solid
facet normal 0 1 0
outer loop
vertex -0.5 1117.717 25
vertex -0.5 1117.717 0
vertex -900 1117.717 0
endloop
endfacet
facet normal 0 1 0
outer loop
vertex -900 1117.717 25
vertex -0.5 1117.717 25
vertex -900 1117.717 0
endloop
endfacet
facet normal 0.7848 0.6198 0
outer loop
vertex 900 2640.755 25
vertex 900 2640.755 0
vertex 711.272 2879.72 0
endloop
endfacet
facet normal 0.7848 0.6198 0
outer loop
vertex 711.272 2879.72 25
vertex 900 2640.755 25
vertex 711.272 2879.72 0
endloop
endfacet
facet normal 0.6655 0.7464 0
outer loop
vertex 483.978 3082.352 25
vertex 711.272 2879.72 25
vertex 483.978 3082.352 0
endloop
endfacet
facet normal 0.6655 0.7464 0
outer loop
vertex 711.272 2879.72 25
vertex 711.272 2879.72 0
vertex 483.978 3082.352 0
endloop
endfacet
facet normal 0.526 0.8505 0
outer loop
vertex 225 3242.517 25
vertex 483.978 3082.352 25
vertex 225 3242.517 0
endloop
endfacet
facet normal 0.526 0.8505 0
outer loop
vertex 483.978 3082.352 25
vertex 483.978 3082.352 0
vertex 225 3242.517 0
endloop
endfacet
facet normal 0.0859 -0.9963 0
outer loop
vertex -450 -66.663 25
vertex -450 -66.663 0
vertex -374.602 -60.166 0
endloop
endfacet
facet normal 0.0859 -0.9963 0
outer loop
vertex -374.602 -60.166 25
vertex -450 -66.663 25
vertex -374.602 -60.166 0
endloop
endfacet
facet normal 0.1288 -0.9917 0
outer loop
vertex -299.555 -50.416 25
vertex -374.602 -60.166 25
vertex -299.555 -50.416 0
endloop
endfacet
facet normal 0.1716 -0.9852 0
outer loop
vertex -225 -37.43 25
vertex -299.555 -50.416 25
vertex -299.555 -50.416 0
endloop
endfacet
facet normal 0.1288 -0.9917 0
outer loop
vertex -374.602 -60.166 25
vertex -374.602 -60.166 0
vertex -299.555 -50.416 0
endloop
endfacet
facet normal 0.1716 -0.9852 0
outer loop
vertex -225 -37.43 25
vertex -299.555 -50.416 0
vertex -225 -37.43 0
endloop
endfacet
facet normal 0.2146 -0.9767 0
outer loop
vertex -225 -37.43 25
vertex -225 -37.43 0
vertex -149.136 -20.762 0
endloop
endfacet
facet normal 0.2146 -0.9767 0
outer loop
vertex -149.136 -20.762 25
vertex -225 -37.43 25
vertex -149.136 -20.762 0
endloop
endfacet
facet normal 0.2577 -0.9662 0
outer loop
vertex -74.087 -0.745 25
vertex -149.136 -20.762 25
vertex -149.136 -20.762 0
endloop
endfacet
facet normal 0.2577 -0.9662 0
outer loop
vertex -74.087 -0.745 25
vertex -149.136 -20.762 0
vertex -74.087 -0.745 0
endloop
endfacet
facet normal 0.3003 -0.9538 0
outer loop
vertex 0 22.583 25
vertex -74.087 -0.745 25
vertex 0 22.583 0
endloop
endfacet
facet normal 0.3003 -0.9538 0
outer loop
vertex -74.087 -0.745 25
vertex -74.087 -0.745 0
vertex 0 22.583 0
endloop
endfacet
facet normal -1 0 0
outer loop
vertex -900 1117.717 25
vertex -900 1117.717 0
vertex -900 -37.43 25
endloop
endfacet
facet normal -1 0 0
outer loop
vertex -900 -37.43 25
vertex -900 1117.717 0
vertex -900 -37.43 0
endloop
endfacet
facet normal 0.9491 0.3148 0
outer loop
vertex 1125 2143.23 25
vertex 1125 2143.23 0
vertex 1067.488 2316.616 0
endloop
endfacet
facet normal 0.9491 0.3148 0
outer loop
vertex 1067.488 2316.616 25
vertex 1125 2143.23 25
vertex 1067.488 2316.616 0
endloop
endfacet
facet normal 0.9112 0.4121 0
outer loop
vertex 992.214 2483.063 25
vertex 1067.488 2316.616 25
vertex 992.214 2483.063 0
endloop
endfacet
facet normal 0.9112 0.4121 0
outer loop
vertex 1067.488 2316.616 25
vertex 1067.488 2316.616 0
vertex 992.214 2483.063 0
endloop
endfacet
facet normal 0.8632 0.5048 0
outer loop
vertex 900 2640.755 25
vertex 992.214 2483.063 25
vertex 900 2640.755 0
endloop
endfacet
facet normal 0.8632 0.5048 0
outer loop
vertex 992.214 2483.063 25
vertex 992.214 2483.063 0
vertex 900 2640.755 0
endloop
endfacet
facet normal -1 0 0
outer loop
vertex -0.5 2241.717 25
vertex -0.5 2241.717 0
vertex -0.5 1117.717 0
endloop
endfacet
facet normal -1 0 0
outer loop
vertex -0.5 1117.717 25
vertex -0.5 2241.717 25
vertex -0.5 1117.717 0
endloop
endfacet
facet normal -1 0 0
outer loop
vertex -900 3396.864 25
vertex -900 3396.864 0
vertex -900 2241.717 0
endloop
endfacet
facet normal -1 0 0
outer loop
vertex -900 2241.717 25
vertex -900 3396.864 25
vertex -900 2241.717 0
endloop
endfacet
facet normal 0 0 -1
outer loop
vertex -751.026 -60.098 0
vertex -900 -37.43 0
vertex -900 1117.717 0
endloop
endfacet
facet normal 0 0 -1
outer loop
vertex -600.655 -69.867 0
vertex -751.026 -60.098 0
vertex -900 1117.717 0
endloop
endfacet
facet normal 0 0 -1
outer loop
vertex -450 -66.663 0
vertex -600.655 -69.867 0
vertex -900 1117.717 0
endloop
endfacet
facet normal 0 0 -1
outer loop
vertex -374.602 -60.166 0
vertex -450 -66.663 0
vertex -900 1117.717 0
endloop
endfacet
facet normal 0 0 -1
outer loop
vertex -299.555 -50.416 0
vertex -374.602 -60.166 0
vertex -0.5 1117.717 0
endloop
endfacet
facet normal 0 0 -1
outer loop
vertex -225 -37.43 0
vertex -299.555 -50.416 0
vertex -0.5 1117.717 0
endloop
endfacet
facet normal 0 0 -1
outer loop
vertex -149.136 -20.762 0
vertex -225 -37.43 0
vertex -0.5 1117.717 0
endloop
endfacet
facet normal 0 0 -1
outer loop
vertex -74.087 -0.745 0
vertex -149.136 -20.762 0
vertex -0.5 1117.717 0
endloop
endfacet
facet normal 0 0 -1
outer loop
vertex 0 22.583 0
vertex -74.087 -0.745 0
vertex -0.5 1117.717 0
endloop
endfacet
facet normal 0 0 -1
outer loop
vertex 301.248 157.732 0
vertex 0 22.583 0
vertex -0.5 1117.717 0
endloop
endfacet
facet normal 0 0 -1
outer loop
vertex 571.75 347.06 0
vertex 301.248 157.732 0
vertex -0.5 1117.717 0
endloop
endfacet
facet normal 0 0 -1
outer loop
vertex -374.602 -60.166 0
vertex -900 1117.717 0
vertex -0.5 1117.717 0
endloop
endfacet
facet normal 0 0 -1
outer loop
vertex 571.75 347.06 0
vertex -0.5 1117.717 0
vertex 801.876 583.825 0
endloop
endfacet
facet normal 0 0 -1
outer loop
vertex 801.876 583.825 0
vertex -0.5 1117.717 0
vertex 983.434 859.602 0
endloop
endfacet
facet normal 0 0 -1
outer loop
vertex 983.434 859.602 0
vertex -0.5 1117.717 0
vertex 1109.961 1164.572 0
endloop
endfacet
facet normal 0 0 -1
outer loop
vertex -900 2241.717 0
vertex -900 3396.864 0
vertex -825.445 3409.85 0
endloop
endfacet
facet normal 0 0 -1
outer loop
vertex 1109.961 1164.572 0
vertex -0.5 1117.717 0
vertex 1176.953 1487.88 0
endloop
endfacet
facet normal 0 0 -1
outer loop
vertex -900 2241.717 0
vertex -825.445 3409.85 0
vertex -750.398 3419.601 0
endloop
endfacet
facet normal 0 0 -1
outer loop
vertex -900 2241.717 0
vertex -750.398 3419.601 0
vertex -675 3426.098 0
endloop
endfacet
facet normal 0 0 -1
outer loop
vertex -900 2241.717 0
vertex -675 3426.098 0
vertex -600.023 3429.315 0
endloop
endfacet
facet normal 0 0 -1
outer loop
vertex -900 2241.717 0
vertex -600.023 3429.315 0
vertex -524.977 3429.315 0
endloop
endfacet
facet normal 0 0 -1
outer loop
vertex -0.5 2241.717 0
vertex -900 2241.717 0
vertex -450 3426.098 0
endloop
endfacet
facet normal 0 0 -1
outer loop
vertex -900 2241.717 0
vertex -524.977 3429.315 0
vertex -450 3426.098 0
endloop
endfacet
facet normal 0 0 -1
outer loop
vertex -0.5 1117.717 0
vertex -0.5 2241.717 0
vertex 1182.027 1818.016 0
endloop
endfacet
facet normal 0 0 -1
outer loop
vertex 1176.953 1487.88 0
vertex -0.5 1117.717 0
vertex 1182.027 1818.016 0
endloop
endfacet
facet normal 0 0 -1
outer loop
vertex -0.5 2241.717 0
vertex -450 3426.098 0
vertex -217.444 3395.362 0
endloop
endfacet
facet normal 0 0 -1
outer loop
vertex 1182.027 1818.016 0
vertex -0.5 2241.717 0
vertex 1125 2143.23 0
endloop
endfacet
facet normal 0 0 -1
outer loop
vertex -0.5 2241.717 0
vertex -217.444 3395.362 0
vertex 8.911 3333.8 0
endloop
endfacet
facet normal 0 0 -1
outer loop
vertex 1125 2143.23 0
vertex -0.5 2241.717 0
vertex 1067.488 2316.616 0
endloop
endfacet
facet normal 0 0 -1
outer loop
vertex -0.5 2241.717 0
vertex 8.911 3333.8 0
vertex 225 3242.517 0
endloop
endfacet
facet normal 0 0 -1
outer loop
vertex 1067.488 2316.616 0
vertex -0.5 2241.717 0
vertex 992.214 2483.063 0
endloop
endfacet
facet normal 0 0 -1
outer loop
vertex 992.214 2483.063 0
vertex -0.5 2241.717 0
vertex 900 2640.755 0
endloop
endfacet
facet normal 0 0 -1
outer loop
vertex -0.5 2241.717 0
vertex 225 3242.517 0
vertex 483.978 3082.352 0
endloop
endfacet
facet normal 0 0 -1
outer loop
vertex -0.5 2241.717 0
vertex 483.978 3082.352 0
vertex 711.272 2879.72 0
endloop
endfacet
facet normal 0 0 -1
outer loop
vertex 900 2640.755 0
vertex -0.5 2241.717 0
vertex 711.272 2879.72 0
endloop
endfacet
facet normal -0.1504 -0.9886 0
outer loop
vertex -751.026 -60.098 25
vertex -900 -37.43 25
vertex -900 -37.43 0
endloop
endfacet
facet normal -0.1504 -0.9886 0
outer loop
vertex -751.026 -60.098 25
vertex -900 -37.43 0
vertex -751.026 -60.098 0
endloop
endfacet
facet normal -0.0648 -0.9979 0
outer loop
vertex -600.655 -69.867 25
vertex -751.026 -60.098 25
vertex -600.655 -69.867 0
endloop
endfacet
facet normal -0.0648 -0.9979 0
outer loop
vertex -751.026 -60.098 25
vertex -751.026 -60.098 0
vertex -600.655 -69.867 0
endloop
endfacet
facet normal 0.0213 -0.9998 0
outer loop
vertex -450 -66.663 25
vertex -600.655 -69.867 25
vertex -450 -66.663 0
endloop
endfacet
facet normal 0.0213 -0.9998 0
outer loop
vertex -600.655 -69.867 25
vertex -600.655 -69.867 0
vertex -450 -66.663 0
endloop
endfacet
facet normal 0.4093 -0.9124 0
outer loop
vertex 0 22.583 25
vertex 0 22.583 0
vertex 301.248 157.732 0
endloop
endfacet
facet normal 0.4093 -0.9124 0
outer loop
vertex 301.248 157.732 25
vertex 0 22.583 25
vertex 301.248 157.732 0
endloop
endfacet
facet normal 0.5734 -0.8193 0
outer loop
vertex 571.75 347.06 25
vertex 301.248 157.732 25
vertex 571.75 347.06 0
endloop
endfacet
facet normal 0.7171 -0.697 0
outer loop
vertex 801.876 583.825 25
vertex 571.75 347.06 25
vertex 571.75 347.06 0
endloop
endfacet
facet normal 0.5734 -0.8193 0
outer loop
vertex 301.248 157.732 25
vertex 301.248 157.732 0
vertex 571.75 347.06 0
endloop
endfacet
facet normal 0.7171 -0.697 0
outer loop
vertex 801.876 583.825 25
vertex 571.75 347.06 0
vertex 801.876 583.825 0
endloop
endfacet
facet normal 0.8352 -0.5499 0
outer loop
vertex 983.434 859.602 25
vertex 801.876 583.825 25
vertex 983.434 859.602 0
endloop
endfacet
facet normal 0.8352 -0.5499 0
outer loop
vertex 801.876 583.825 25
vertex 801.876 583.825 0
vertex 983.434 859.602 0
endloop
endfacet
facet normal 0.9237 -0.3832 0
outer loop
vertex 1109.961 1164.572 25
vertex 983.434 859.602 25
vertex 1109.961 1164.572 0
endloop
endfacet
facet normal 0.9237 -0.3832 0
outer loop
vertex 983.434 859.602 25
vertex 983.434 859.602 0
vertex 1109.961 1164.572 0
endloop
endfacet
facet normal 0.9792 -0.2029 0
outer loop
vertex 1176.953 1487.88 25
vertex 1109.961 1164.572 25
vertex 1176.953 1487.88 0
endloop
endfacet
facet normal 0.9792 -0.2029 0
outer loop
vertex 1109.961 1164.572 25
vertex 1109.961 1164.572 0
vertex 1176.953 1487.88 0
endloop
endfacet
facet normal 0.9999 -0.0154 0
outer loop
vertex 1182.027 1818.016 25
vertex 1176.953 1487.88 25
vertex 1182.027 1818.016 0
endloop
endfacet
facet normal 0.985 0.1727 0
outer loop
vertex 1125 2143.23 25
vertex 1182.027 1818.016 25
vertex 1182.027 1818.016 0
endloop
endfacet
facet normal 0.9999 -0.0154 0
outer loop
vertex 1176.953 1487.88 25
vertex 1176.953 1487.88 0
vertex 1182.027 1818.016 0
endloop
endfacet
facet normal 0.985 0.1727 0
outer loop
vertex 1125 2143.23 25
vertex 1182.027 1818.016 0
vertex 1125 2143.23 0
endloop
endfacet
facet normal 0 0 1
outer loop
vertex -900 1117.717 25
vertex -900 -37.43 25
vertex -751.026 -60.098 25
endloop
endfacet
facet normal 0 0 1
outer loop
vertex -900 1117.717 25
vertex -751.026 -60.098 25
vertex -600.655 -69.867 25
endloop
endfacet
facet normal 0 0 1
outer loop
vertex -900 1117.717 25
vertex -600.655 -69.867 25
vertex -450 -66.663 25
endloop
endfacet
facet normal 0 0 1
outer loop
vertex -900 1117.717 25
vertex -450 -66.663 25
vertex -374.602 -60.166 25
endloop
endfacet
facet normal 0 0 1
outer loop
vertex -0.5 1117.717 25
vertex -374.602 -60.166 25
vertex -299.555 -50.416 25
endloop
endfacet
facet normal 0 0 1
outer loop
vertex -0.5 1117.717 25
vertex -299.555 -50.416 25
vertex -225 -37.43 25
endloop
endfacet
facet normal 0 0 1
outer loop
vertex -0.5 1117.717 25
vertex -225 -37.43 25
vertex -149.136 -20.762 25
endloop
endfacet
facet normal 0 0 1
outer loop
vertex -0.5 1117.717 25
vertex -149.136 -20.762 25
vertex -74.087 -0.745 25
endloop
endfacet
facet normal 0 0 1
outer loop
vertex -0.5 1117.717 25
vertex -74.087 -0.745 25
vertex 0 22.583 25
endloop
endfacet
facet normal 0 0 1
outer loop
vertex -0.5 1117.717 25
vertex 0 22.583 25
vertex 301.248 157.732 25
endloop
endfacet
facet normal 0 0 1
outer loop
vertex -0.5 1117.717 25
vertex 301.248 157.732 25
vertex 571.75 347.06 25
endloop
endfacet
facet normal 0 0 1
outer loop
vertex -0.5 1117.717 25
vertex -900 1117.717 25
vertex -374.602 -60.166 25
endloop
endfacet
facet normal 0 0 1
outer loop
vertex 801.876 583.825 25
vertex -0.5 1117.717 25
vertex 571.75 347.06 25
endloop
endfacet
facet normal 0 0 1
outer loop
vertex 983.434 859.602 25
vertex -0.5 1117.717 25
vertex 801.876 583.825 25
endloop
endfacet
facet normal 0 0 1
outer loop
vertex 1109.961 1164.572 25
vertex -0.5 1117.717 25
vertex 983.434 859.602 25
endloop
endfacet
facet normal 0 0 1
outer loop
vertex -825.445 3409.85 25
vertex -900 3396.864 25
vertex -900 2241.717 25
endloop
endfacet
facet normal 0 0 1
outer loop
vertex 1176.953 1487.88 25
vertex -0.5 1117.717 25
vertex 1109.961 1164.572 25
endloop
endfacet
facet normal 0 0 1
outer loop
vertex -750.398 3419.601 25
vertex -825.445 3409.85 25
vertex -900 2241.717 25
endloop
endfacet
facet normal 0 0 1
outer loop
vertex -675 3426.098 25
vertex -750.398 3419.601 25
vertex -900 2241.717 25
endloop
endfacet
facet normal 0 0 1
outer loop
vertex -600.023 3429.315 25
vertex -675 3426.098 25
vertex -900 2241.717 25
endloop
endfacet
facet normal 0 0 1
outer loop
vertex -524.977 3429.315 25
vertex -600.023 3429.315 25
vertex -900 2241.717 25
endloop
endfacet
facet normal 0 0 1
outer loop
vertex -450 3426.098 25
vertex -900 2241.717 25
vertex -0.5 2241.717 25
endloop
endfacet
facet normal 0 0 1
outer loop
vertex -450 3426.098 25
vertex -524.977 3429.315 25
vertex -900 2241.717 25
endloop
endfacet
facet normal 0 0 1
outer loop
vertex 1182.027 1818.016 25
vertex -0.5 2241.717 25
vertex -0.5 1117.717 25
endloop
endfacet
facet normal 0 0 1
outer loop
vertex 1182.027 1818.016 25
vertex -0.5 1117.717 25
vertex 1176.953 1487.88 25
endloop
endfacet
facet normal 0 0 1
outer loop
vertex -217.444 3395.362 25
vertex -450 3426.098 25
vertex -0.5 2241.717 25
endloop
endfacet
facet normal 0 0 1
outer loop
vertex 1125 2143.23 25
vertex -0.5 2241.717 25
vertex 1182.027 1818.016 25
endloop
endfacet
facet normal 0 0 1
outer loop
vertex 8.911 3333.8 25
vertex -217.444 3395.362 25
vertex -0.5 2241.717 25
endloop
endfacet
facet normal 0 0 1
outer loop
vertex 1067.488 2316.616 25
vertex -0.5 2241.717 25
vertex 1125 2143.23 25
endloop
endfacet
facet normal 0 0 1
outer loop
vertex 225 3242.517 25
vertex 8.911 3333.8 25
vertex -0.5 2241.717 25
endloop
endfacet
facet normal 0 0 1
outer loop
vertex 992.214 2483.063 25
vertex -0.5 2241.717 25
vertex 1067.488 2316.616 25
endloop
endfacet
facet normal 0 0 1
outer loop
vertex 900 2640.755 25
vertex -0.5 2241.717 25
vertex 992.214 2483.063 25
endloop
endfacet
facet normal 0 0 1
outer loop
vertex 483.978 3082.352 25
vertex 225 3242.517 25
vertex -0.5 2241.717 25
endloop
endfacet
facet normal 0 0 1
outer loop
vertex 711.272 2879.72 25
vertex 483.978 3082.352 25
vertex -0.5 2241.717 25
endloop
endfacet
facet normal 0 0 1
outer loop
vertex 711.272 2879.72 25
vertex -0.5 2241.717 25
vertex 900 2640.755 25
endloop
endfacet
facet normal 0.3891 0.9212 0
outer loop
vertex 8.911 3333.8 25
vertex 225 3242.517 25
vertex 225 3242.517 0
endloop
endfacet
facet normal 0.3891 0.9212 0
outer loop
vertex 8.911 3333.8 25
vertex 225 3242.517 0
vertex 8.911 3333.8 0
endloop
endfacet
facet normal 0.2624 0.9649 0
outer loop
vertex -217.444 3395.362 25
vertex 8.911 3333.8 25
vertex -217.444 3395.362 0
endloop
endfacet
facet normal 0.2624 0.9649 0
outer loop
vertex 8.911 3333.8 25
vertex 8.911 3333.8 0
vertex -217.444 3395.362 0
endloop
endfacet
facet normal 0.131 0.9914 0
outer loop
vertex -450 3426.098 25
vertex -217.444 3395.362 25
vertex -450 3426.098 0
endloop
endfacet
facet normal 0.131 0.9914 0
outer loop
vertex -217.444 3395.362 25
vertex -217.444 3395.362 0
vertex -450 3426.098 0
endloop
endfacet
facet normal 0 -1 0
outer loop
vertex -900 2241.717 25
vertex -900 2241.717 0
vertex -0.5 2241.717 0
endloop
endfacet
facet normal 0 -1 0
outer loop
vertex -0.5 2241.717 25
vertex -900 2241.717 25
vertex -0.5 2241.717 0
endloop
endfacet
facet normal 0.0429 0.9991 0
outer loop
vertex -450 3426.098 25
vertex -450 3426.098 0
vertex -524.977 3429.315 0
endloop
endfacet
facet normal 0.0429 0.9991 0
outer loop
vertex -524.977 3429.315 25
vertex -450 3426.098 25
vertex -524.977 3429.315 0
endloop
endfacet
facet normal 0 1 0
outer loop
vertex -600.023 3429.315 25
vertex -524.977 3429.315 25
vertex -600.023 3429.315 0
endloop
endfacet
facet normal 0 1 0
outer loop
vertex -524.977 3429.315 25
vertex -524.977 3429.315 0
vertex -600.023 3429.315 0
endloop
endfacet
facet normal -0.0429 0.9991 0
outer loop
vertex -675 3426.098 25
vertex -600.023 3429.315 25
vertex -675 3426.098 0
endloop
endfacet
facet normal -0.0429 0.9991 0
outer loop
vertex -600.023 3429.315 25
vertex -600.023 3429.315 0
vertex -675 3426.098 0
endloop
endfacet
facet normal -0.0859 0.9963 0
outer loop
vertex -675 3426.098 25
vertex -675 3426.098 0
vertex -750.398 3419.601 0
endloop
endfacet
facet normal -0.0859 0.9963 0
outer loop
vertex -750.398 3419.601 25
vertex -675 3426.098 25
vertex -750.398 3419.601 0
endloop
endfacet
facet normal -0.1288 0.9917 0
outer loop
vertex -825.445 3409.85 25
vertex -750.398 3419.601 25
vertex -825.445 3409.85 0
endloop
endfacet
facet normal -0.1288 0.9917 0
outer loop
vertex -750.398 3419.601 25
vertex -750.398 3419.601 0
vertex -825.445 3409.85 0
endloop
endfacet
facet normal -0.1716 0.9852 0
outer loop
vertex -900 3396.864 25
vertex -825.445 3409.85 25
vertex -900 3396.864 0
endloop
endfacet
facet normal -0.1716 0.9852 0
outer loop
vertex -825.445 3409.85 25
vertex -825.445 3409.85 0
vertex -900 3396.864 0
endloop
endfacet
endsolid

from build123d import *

# Parameters (mm, degrees)
F1_DEPTH = 25


with BuildPart() as f1:
    # F0 (on Top) → F1 (new body)
    with BuildSketch(Plane.XY):
        with BuildLine():
            Line((-675, 2241.7173917294), (-675, 3426.0975765688))
            ThreePointArc((-675, 3426.0975765688), (-787.9742669801, 3415.1312775012), (-900, 3396.8643714606))
            Line((-900, 3396.8643714606), (-900, 2241.7173917294))
            Line((-900, 2241.7173917294), (-675, 2241.7173917294))
        make_face()
        with BuildLine():
            Line((-450, 2241.7173917294), (-450, 3426.0975765688))
            ThreePointArc((-450, 3426.0975765688), (-562.5, 3429.7173917294), (-675, 3426.0975765688))
            Line((-675, 3426.0975765688), (-675, 2241.7173917294))
            Line((-675, 2241.7173917294), (-450, 2241.7173917294))
        make_face()
        with BuildLine():
            Line((-675, -66.6627931101), (-675, 1117.7173917294))
            Line((-675, 1117.7173917294), (-900, 1117.7173917294))
            Line((-900, 1117.7173917294), (-900, -37.4295880018))
            ThreePointArc((-900, -37.4295880018), (-787.9742669801, -55.6964940425), (-675, -66.6627931101))
        make_face()
        with BuildLine():
            Line((-450, -66.6627931101), (-450, 1117.7173917294))
            Line((-450, 1117.7173917294), (-675, 1117.7173917294))
            Line((-675, 1117.7173917294), (-675, -66.6627931101))
            ThreePointArc((-675, -66.6627931101), (-562.5, -70.2826082706), (-450, -66.6627931101))
        make_face()
        with BuildLine():
            Line((-225, 1117.7173917294), (-450, 1117.7173917294))
            Line((-450, 1117.7173917294), (-450, -66.6627931101))
            ThreePointArc((-450, -66.6627931101), (-337.0257330199, -55.6964940425), (-225, -37.4295880018))
            Line((-225, -37.4295880018), (-225, 1117.7173917294))
        make_face()
        with BuildLine():
            ThreePointArc((0, 3336.8515896747), (-111.5006834878, 3370.6046193426), (-225, 3396.8643714606))
            Line((-225, 3396.8643714606), (-225, 2241.7173917294))
            Line((-225, 2241.7173917294), (-0.5, 2241.7173917294))
            Line((-0.5, 2241.7173917294), (-0.5, 1117.7173917294))
            Line((-0.5, 1117.7173917294), (-225, 1117.7173917294))
            Line((-225, 1117.7173917294), (-225, -37.4295880018))
            ThreePointArc((-225, -37.4295880018), (-111.5006834878, -11.1698358839), (0, 22.583193784))
            Line((0, 22.583193784), (0, 3336.8515896747))
        make_face()
        with BuildLine():
            ThreePointArc((450, 3107.0729010542), (340.044348253, 3179.0217969241), (225, 3242.5173629349))
            Line((225, 3242.5173629349), (225, 116.9174205238))
            ThreePointArc((225, 116.9174205238), (340.044348253, 180.4129865346), (450, 252.3618824045))
            Line((450, 252.3618824045), (450, 3107.0729010542))
        make_face()
        with BuildLine():
            ThreePointArc((900, 2640.7552421807), (794.5520917452, 2784.6651824823), (674.9999999999, 2917.0911226612))
            Line((675, 2917.0911226612), (675, 442.3436607977))
            ThreePointArc((675.0000000001, 442.3436607977), (794.5520917453, 574.7696009764), (900, 718.679541278))
            Line((900, 718.679541278), (900, 2640.7552421807))
        make_face()
        with BuildLine():
            ThreePointArc((1125, 2143.2297971729), (1032.024346665, 2400.8221746094), (900, 2640.7552421807))
            Line((900, 2640.7552421807), (900, 718.679541278))
            ThreePointArc((900, 718.679541278), (1032.024346665, 958.6126088493), (1125, 1216.2049862858))
            Line((1125, 1216.2049862858), (1125, 2143.2297971729))
        make_face()
        with BuildLine():
            ThreePointArc((1187.5, 1679.7173917294), (1171.8046156889, 1913.5709784027), (1125, 2143.2297971729))
            Line((1125, 2143.2297971729), (1125, 1216.2049862858))
            ThreePointArc((1125, 1216.2049862858), (1171.8046156889, 1445.863805056), (1187.5, 1679.7173917294))
        make_face()
        with BuildLine():
            ThreePointArc((674.9999999999, 2917.0911226612), (566.5032192294, 3016.8231208958), (450, 3107.0729010542))
            Line((450, 3107.0729010542), (450, 252.3618824045))
            ThreePointArc((450, 252.3618824045), (566.5032192294, 342.611662563), (675.0000000001, 442.3436607977))
            Line((675, 442.3436607977), (675, 2917.0911226612))
        make_face()
        with BuildLine():
            ThreePointArc((225, 3242.5173629349), (114.1459462552, 3293.6102826662), (0, 3336.8515896747))
            Line((0, 3336.8515896747), (0, 22.583193784))
            ThreePointArc((0, 22.583193784), (114.1459462552, 65.8245007925), (225, 116.9174205238))
            Line((225, 116.9174205238), (225, 3242.5173629349))
        make_face()
        with BuildLine():
            ThreePointArc((-225, 3396.8643714606), (-337.0257330198, 3415.1312775012), (-450, 3426.0975765688))
            Line((-450, 3426.0975765688), (-450, 2241.7173917294))
            Line((-450, 2241.7173917294), (-225, 2241.7173917294))
            Line((-225, 2241.7173917294), (-225, 3396.8643714606))
        make_face()
    extrude(amount=F1_DEPTH)


solid = f1.part
